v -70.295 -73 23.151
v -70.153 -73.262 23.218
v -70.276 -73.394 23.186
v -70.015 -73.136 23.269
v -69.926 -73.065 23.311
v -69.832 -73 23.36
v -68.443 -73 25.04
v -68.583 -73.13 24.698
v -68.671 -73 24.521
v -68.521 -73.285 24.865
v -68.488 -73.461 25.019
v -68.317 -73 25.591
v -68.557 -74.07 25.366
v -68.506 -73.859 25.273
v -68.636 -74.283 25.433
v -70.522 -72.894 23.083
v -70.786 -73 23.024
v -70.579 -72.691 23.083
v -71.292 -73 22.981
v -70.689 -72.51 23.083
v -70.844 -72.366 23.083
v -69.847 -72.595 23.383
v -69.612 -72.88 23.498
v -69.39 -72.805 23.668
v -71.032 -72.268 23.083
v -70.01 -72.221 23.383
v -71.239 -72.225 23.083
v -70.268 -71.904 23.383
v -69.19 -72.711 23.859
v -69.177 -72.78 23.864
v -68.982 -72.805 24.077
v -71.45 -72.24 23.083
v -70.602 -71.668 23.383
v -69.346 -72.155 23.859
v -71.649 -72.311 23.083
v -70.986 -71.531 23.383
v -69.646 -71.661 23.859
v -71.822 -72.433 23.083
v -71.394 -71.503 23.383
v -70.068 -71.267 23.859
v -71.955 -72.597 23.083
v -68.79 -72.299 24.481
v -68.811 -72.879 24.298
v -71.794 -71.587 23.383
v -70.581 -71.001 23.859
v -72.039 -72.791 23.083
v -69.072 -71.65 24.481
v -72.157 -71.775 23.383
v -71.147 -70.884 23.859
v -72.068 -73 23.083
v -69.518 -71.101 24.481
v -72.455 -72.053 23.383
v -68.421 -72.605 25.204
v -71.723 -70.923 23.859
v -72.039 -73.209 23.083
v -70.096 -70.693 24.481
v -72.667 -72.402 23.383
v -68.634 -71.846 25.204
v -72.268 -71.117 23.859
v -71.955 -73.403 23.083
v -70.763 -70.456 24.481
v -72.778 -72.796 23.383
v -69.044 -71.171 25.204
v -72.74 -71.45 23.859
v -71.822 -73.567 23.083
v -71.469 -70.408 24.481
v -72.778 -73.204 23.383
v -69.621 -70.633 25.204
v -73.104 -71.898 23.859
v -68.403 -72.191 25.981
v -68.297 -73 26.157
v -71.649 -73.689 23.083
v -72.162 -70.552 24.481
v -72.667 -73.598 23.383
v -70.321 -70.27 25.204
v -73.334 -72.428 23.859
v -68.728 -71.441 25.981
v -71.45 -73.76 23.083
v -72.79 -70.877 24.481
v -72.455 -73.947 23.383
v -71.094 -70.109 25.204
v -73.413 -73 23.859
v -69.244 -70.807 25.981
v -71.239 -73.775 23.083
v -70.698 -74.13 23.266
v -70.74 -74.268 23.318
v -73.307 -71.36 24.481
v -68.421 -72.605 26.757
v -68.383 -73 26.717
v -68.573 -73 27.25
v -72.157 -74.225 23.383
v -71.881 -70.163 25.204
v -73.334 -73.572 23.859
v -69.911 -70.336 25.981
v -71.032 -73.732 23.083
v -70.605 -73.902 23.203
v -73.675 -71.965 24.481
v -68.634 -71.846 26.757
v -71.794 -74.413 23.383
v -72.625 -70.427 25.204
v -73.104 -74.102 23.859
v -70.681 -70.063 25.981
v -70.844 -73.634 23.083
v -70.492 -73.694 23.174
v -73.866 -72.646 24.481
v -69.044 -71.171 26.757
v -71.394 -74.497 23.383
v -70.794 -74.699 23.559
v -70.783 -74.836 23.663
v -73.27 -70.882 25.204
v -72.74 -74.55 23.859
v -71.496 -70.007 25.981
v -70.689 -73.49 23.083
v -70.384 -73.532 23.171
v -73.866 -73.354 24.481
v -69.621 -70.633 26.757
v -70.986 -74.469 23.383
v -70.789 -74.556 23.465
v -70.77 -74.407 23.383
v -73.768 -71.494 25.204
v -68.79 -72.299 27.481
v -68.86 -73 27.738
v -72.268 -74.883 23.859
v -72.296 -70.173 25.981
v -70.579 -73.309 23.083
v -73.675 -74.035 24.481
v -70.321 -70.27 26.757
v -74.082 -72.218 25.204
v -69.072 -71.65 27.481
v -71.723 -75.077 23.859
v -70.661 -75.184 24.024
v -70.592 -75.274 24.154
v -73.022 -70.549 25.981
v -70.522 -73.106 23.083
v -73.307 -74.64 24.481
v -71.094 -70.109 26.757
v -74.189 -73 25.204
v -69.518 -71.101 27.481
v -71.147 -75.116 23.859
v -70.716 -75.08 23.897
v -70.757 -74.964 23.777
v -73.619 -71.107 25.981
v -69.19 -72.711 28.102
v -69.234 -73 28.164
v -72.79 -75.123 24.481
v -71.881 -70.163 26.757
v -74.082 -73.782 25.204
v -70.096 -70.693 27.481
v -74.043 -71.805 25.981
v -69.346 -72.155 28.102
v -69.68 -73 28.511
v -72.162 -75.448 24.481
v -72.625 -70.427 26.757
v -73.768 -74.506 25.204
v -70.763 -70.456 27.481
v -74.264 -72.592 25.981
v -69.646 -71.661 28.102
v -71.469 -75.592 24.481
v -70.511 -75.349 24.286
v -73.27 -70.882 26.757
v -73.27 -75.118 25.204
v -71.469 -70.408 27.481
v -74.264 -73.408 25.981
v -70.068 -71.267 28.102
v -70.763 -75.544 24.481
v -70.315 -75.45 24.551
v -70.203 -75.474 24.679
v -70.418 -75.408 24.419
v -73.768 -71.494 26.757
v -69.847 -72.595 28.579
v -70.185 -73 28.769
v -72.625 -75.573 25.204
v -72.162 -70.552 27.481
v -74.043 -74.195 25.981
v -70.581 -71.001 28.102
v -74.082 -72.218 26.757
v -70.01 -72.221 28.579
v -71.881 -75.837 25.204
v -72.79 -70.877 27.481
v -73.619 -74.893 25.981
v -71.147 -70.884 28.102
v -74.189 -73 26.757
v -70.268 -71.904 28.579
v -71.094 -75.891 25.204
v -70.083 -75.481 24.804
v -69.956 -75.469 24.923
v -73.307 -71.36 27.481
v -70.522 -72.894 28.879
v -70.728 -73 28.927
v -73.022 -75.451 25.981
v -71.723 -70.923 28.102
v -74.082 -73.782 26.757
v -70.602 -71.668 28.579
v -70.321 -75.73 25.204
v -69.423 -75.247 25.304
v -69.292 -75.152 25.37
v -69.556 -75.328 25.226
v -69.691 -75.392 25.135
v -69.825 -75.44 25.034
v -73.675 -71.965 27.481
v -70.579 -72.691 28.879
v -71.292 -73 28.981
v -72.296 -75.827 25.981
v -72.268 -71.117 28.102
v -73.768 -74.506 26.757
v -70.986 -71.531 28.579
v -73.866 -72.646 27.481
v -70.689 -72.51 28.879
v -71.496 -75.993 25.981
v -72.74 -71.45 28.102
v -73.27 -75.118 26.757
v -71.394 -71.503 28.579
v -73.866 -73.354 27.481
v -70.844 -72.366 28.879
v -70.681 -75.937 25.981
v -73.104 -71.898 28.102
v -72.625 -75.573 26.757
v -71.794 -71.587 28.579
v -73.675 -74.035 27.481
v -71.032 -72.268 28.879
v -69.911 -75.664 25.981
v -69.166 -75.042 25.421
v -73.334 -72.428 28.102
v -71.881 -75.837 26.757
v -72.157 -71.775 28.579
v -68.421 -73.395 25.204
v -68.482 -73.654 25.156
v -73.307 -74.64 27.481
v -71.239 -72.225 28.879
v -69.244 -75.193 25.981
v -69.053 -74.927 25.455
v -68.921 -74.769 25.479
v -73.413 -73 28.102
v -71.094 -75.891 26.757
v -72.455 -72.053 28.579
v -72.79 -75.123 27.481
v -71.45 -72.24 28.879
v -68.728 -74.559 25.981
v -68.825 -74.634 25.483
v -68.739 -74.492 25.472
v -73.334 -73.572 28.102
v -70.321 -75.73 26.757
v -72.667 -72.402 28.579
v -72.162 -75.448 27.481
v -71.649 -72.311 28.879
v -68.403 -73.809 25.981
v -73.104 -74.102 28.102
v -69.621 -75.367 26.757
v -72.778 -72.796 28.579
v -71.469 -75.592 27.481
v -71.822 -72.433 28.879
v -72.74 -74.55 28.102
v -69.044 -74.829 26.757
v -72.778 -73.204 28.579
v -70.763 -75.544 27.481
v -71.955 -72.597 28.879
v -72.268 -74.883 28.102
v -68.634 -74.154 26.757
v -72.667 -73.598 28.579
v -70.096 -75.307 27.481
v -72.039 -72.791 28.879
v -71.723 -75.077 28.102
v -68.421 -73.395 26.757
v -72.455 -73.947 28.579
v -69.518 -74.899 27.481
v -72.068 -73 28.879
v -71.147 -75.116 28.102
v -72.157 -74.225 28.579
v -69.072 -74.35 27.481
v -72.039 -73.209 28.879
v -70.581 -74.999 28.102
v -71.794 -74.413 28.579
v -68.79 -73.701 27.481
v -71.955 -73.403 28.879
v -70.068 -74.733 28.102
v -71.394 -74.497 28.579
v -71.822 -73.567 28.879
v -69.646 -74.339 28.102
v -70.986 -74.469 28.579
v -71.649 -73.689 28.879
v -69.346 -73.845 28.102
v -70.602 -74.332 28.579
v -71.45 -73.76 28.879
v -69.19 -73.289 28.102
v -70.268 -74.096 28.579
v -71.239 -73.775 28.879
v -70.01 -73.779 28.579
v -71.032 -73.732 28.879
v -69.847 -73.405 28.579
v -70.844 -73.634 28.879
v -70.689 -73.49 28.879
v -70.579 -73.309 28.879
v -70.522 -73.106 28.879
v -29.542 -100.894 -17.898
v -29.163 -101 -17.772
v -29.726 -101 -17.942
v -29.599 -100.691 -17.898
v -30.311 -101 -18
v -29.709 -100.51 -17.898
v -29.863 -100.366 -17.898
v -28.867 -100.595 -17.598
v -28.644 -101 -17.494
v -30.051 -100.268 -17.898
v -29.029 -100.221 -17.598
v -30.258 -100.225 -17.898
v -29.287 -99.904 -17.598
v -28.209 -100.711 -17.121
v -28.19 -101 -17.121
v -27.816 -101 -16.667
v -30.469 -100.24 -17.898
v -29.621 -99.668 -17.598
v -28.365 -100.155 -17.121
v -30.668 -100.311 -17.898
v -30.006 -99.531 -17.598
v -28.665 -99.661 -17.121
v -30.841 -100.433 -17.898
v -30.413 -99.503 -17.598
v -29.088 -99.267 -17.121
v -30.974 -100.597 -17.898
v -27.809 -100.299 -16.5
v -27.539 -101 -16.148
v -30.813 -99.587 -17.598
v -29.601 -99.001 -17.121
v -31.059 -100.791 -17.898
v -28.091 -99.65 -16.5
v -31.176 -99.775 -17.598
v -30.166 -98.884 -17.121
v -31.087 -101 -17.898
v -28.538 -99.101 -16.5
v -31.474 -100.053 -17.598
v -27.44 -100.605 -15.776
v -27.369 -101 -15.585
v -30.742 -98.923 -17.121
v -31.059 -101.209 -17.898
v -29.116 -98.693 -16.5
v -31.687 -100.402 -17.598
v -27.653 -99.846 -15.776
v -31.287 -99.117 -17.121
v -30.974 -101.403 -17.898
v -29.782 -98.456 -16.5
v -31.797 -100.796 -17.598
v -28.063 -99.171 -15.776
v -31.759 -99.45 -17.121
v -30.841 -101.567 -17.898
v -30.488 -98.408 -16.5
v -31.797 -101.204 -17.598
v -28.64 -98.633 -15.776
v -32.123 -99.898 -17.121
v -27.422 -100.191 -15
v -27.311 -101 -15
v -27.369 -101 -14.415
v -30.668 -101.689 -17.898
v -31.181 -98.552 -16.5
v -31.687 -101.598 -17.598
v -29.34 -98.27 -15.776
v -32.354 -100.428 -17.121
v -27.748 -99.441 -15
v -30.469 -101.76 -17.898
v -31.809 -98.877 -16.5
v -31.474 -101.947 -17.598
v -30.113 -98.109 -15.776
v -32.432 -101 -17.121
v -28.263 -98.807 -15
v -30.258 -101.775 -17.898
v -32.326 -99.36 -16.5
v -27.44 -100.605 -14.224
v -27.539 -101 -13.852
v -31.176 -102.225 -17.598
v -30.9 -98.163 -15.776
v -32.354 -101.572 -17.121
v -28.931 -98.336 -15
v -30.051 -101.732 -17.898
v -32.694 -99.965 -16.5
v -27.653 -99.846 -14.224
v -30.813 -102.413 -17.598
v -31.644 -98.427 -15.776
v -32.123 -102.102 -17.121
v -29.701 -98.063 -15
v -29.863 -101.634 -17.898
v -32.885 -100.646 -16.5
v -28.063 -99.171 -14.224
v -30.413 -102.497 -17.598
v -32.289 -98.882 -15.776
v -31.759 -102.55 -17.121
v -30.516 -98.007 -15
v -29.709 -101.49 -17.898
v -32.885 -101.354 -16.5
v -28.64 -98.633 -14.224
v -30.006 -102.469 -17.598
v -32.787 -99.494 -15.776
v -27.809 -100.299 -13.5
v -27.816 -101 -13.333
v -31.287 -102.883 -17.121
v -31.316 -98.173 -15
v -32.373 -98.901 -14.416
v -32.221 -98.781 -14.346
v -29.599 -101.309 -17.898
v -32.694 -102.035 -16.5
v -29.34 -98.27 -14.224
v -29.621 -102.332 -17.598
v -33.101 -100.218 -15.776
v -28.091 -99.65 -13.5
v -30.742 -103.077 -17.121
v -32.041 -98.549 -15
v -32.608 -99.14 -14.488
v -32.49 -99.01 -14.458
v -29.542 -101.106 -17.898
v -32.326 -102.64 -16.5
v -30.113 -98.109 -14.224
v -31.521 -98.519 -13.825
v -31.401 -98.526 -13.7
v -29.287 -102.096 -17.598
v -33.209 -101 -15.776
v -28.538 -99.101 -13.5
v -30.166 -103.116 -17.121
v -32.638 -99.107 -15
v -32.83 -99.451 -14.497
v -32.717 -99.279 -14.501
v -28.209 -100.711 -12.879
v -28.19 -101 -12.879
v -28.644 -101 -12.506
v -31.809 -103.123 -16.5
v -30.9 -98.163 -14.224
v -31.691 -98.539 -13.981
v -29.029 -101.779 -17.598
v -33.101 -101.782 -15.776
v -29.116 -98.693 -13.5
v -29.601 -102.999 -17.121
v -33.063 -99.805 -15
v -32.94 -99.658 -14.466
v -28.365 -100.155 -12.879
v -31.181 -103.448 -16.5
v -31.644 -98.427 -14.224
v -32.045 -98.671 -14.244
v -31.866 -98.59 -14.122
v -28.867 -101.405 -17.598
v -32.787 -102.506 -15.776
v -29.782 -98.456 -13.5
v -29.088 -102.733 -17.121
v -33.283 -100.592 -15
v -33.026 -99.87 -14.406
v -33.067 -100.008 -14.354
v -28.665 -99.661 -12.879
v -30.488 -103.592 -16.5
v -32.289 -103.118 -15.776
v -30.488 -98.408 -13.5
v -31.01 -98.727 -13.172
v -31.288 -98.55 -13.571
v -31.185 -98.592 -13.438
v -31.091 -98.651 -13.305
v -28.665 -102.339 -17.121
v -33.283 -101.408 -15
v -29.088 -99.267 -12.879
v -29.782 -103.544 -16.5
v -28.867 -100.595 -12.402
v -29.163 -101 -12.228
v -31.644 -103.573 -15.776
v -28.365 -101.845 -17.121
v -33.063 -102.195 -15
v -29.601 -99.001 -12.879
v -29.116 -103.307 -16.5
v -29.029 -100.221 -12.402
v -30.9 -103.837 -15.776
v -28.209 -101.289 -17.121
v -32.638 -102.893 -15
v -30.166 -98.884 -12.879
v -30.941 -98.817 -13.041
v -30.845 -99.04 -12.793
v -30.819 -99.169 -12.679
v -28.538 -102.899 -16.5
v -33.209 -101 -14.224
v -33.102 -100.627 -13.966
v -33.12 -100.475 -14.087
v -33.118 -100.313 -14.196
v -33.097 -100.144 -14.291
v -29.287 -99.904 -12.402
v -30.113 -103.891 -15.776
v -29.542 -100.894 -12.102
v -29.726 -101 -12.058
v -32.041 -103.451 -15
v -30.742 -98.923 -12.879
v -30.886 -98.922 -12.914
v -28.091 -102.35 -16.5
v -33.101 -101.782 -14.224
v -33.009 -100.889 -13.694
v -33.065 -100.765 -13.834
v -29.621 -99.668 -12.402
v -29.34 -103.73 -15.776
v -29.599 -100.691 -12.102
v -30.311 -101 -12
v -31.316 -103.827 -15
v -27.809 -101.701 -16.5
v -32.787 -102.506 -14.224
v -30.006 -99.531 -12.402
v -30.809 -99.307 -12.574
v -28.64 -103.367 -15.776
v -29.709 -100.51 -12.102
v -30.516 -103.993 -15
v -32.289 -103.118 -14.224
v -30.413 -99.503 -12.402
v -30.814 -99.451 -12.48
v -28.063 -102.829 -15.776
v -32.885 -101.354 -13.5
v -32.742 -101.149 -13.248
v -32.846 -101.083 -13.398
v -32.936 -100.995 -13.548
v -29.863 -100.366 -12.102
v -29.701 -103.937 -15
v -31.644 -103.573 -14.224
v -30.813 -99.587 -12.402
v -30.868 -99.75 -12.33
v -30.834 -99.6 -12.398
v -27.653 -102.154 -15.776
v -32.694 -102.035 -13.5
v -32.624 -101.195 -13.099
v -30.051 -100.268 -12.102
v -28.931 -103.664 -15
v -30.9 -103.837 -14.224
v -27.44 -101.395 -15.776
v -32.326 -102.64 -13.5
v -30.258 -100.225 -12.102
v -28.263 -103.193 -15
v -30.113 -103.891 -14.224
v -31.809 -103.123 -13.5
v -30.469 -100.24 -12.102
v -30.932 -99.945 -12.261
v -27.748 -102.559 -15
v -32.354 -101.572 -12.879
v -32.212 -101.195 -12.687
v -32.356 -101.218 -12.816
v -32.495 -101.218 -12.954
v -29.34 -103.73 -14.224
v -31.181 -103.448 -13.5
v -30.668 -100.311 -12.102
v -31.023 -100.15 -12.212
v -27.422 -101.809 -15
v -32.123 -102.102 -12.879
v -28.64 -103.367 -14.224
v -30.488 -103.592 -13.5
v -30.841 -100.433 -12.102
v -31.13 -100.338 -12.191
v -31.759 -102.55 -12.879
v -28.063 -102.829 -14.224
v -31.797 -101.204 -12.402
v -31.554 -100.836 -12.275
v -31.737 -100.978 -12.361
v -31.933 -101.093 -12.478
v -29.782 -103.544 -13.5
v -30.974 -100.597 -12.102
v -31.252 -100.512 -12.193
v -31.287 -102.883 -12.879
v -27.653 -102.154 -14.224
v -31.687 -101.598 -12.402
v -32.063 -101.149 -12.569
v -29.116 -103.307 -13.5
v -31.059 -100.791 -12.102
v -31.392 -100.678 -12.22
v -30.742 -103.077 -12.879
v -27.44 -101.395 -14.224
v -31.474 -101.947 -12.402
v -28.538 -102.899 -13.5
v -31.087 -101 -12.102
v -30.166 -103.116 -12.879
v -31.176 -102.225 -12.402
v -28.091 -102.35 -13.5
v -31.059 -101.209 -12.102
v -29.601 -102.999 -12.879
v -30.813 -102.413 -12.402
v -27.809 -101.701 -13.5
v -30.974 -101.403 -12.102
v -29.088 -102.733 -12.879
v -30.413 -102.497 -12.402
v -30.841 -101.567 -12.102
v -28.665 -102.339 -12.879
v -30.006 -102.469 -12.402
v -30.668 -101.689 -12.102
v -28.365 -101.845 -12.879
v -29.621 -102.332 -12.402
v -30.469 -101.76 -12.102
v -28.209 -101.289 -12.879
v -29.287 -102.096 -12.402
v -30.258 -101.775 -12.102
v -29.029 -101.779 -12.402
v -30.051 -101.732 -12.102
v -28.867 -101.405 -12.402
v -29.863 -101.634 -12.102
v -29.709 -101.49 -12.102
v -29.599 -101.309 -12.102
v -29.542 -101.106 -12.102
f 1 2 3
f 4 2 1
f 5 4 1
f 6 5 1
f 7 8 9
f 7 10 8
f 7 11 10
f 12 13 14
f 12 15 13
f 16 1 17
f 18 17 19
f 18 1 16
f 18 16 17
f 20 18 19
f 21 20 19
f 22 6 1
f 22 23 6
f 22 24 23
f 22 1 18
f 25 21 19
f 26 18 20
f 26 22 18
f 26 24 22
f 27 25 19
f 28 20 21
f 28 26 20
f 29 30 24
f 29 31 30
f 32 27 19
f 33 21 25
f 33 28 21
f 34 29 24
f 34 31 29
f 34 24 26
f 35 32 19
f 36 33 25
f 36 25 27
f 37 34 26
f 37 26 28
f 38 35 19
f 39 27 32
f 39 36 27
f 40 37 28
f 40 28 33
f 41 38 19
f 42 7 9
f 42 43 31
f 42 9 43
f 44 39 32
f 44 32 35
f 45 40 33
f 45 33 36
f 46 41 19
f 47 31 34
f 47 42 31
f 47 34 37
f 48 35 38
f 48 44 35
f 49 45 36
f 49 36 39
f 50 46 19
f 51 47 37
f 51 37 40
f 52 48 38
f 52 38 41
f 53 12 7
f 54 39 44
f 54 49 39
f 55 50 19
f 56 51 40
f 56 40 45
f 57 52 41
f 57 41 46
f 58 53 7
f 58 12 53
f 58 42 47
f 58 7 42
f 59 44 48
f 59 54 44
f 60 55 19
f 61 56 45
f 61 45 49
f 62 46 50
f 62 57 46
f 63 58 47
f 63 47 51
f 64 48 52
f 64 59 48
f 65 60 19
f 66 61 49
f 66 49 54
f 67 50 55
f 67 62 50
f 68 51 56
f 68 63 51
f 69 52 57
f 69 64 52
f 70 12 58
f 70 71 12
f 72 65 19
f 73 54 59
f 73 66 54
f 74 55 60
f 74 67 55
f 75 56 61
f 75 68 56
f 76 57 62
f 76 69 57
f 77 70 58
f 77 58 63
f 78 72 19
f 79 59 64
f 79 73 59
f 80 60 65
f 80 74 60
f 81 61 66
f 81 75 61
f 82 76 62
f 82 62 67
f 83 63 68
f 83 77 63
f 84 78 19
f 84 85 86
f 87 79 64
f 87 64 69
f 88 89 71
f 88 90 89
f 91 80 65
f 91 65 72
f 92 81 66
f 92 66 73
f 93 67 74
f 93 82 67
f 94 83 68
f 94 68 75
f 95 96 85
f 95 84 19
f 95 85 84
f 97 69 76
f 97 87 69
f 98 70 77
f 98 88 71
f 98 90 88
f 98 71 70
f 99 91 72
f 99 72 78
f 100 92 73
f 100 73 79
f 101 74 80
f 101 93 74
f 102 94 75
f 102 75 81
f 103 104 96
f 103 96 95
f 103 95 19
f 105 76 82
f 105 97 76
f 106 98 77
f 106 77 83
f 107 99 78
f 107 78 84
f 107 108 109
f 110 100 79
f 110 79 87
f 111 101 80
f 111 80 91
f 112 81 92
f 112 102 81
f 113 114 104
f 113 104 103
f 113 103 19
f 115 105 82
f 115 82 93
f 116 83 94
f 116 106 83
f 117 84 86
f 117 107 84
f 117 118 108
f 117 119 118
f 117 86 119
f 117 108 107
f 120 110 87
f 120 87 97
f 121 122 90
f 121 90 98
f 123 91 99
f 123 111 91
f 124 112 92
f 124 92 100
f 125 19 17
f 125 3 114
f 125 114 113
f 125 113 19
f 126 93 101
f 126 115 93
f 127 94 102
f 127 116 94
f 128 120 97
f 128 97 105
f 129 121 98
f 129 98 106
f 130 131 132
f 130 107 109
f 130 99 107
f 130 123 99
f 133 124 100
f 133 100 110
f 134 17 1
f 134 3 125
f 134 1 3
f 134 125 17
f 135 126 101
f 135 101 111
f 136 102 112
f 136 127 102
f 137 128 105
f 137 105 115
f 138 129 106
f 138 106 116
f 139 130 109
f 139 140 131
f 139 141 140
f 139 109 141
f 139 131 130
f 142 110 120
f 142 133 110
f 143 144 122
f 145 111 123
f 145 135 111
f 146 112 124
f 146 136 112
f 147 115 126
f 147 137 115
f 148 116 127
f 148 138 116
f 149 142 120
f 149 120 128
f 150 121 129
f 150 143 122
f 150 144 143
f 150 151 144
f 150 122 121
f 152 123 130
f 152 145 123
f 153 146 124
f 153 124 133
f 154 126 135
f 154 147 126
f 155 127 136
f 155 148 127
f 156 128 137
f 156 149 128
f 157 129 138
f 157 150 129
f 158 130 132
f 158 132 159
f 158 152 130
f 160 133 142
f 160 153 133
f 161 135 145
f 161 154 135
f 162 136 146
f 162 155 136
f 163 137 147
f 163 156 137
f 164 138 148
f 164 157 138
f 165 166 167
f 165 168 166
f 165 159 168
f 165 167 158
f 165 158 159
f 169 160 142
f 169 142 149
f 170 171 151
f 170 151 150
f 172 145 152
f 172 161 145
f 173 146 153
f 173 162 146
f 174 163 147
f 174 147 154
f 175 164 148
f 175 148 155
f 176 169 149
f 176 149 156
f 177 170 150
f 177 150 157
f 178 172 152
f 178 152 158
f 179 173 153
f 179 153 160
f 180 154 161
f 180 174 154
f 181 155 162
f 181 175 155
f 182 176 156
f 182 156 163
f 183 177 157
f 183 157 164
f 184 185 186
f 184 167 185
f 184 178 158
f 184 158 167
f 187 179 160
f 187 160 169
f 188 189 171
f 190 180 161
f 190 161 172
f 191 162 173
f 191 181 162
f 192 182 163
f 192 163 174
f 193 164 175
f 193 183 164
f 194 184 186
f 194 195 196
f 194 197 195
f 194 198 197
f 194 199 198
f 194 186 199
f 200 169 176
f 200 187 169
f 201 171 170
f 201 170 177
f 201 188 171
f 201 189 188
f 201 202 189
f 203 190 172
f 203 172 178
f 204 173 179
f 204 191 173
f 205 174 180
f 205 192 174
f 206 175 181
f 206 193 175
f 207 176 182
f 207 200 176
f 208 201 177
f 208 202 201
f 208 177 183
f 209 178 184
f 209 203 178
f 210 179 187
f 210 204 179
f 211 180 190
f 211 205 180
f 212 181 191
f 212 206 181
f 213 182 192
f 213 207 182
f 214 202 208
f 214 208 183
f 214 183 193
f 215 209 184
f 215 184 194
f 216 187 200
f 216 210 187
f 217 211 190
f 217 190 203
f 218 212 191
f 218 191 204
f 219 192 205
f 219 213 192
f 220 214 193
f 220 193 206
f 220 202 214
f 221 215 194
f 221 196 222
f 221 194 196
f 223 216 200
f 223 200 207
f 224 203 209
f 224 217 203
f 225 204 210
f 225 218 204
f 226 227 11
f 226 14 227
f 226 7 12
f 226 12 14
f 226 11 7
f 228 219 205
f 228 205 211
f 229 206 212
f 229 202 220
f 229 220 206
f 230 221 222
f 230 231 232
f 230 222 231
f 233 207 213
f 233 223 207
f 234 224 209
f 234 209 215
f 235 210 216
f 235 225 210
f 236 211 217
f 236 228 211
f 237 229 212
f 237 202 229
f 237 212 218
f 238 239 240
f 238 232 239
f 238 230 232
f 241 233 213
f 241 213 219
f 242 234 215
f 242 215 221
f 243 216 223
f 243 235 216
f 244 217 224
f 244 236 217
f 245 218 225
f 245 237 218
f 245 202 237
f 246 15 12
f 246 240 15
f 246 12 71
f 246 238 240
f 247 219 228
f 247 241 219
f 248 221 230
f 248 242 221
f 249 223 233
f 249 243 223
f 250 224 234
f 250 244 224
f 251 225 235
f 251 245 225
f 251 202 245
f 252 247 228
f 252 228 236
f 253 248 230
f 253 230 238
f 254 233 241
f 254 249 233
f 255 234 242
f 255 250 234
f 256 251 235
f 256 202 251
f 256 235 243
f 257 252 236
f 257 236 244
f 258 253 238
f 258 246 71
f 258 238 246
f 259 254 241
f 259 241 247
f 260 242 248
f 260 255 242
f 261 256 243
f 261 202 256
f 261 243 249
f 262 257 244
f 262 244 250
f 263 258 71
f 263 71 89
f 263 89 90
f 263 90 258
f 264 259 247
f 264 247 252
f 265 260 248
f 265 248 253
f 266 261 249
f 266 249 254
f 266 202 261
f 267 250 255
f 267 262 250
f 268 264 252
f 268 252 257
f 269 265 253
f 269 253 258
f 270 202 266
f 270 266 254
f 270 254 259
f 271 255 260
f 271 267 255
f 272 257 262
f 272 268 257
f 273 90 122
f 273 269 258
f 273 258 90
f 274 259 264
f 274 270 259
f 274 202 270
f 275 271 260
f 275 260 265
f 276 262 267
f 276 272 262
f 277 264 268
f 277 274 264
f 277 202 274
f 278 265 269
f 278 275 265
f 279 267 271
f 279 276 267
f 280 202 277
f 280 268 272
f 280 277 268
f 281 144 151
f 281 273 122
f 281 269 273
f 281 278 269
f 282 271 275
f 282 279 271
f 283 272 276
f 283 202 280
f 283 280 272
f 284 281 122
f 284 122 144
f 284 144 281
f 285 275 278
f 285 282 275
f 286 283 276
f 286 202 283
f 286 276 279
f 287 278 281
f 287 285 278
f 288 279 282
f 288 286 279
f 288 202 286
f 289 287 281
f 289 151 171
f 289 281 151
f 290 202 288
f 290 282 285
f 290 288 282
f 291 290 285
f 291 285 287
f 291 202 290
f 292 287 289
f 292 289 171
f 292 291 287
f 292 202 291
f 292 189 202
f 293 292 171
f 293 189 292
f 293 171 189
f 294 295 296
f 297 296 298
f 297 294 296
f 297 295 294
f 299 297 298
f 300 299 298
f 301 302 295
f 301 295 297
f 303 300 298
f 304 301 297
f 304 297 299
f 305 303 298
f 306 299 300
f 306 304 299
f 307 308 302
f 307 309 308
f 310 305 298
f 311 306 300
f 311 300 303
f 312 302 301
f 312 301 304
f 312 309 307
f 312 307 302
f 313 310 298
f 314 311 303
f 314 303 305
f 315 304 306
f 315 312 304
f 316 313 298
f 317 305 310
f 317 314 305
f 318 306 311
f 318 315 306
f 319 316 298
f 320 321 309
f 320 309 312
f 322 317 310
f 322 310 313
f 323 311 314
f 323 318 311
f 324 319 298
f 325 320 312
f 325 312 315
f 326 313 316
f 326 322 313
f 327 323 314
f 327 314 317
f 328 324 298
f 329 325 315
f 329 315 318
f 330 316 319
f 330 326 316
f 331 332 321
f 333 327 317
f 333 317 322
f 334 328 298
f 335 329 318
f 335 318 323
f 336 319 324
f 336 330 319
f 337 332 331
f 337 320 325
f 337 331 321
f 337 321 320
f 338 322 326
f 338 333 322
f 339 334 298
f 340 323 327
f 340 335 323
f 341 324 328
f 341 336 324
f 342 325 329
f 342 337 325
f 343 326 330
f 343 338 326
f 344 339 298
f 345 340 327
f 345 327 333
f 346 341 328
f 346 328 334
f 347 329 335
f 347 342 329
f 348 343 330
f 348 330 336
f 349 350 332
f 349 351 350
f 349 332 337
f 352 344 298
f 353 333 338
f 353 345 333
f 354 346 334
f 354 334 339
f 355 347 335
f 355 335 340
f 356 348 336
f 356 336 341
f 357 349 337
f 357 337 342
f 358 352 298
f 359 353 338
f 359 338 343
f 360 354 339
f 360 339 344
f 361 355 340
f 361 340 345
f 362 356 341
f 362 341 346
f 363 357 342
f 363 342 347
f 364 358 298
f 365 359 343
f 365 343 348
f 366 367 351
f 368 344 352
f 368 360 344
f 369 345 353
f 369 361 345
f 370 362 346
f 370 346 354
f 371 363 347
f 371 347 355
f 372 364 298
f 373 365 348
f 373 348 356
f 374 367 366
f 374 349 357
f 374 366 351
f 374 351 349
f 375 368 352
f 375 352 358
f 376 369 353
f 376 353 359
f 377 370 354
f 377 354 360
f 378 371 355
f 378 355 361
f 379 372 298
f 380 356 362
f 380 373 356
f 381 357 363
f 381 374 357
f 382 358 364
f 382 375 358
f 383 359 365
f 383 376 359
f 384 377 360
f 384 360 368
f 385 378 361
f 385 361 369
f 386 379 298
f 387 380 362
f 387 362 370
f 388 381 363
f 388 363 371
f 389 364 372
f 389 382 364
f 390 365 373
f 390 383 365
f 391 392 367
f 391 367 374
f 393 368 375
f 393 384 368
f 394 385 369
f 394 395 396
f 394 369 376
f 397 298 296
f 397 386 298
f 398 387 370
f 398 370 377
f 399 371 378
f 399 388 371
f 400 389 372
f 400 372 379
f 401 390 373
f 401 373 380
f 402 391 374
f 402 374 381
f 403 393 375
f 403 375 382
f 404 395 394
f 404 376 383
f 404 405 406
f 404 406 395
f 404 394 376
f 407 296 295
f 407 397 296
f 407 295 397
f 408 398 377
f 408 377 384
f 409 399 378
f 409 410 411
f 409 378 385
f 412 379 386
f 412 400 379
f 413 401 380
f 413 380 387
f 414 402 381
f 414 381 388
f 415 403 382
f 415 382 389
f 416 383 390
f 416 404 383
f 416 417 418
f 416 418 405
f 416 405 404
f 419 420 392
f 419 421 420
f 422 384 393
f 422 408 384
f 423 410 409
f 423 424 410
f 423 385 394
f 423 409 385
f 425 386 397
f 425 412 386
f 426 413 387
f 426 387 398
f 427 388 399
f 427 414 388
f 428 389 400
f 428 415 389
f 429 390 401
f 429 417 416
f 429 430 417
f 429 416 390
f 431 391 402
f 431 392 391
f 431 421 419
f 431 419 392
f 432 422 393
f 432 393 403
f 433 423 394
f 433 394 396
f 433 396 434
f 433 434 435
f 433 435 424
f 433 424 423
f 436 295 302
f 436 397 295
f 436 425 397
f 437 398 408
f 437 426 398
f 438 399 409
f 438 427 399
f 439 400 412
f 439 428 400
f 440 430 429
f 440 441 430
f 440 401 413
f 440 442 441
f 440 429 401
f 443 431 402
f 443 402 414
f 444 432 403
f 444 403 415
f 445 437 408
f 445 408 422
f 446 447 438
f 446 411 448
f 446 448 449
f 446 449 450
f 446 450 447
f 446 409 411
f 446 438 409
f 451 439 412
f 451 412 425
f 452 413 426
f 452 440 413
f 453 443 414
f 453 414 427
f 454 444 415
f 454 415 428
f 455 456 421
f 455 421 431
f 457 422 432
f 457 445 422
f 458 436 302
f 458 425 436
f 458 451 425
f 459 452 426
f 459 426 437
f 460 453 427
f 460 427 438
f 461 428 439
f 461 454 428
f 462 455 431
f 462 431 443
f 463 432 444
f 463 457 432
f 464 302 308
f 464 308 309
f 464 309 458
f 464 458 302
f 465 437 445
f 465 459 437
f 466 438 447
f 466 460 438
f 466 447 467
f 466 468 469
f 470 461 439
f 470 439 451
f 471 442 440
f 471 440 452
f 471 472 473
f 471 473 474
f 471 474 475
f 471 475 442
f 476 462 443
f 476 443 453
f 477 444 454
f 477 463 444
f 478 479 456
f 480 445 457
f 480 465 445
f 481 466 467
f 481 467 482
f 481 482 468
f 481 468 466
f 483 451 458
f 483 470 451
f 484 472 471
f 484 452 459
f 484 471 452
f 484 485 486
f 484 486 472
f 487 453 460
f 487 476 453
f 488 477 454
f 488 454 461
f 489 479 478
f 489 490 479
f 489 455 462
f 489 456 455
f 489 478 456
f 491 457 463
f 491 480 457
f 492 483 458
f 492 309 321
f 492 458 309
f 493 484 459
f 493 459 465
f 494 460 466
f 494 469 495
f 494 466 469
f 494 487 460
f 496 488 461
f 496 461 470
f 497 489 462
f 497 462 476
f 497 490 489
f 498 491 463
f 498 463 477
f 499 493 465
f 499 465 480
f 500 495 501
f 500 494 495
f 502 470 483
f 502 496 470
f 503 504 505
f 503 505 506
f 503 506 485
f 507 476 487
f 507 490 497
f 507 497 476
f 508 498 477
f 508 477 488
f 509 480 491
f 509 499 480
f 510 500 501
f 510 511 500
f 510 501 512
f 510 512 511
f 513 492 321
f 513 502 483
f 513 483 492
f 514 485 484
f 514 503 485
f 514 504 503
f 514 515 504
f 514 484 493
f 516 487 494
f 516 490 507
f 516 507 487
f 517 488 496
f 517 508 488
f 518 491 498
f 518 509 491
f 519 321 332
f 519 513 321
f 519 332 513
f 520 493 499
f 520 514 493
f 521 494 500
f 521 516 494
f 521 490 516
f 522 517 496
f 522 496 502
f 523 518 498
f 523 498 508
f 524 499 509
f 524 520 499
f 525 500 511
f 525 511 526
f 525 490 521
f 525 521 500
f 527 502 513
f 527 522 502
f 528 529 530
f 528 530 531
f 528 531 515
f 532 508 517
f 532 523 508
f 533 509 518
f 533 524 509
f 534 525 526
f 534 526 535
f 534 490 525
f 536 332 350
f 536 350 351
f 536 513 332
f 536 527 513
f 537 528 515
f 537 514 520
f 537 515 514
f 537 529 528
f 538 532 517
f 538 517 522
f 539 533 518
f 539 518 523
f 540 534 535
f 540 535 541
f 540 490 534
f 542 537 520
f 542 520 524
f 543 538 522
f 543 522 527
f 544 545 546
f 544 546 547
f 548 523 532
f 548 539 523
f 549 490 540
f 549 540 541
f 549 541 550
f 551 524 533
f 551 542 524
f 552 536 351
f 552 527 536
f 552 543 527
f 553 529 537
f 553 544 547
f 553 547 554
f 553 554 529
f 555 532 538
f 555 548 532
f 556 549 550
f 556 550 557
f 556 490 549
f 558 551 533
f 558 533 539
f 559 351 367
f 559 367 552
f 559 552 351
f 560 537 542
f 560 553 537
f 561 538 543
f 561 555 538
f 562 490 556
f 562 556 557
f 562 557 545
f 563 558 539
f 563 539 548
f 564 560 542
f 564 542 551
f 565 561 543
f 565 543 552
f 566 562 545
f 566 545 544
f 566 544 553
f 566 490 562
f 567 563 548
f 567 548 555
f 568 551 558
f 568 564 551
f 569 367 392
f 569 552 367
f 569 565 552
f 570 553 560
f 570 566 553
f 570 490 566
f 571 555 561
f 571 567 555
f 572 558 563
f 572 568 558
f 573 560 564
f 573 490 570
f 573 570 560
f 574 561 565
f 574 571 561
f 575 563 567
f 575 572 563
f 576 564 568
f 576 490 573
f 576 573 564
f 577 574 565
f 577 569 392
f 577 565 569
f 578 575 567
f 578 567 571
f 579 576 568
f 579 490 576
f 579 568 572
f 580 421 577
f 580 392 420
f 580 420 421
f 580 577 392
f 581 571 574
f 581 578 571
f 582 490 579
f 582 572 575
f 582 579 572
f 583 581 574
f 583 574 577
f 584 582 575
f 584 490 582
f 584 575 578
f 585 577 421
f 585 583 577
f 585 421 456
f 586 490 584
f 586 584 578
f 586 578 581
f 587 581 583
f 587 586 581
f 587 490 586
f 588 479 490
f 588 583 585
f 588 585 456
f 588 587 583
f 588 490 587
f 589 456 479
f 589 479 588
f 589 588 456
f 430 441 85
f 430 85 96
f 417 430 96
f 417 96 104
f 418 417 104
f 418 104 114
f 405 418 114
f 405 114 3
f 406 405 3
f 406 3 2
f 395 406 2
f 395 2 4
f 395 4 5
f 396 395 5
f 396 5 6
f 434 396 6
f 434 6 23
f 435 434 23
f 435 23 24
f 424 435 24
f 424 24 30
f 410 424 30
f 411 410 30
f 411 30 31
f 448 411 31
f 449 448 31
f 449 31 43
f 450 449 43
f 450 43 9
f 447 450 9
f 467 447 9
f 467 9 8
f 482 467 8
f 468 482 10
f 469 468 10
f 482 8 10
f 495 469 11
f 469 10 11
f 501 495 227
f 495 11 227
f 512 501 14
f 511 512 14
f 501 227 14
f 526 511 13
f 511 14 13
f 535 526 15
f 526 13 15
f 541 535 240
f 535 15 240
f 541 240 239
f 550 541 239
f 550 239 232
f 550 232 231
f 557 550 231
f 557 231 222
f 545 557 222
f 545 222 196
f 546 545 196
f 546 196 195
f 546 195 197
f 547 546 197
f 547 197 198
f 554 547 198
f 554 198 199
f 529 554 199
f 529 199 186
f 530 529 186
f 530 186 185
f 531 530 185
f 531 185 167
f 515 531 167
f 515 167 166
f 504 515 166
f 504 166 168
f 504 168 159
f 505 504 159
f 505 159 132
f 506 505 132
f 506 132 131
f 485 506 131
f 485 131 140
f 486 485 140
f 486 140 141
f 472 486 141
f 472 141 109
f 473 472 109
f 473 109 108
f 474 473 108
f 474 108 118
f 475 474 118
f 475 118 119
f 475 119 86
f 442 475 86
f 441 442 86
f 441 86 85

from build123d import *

# Parameters (mm, degrees)
STRAIGHT_STRUT_CORE_SKETCH_R = 1.5
STRAIGHT_STRUT_CORE_DEPTH    = 64.364941753


with BuildPart() as part:
    # Straight strut core sketch → Straight strut core (new body)
    with BuildSketch(Plane(origin=(-19.213082616, 13.127289135, 19.213082616), x_dir=(-0.7711166905176088, -0.35918583184116987, -0.5257038974648537), z_dir=(0.6366938429144502, -0.43501942576095104, -0.6366938429146632))):
        with Locations(Location((67.536559993, -74.931313845, 0), (0, 0, 23.509976133))):
            Circle(STRAIGHT_STRUT_CORE_SKETCH_R)
    extrude(amount=STRAIGHT_STRUT_CORE_DEPTH)

    # Ball end1 profile → Ball end1 (revolve)
    with BuildSketch(Plane(origin=(0, -73, 0), x_dir=(-1, 0, 0), z_dir=(0, -1, 0))):
        with BuildLine():
            Line((71.291651246, -28.980762114), (71.291651246, -22.980762114))
            ThreePointArc((71.291651246, -22.980762114), (68.291651246, -25.980762114), (71.291651246, -28.980762114))
        make_face()
    revolve(axis=Axis((-71.291651246, -73, 15.980762114), (0, 0, 1)))

    # Ball end2 profile → Ball end2 (revolve)
    with BuildSketch(Plane(origin=(0, -101, 0), x_dir=(-1, 0, 0), z_dir=(0, -1, 0))):
        with BuildLine():
            Line((30.310889133, 12), (30.310889133, 18))
            ThreePointArc((30.310889133, 18), (27.310889133, 15), (30.310889133, 12))
        make_face()
    revolve(axis=Axis((-30.310889133, -101, -25), (0, 0, 1)))


solid = part.part
